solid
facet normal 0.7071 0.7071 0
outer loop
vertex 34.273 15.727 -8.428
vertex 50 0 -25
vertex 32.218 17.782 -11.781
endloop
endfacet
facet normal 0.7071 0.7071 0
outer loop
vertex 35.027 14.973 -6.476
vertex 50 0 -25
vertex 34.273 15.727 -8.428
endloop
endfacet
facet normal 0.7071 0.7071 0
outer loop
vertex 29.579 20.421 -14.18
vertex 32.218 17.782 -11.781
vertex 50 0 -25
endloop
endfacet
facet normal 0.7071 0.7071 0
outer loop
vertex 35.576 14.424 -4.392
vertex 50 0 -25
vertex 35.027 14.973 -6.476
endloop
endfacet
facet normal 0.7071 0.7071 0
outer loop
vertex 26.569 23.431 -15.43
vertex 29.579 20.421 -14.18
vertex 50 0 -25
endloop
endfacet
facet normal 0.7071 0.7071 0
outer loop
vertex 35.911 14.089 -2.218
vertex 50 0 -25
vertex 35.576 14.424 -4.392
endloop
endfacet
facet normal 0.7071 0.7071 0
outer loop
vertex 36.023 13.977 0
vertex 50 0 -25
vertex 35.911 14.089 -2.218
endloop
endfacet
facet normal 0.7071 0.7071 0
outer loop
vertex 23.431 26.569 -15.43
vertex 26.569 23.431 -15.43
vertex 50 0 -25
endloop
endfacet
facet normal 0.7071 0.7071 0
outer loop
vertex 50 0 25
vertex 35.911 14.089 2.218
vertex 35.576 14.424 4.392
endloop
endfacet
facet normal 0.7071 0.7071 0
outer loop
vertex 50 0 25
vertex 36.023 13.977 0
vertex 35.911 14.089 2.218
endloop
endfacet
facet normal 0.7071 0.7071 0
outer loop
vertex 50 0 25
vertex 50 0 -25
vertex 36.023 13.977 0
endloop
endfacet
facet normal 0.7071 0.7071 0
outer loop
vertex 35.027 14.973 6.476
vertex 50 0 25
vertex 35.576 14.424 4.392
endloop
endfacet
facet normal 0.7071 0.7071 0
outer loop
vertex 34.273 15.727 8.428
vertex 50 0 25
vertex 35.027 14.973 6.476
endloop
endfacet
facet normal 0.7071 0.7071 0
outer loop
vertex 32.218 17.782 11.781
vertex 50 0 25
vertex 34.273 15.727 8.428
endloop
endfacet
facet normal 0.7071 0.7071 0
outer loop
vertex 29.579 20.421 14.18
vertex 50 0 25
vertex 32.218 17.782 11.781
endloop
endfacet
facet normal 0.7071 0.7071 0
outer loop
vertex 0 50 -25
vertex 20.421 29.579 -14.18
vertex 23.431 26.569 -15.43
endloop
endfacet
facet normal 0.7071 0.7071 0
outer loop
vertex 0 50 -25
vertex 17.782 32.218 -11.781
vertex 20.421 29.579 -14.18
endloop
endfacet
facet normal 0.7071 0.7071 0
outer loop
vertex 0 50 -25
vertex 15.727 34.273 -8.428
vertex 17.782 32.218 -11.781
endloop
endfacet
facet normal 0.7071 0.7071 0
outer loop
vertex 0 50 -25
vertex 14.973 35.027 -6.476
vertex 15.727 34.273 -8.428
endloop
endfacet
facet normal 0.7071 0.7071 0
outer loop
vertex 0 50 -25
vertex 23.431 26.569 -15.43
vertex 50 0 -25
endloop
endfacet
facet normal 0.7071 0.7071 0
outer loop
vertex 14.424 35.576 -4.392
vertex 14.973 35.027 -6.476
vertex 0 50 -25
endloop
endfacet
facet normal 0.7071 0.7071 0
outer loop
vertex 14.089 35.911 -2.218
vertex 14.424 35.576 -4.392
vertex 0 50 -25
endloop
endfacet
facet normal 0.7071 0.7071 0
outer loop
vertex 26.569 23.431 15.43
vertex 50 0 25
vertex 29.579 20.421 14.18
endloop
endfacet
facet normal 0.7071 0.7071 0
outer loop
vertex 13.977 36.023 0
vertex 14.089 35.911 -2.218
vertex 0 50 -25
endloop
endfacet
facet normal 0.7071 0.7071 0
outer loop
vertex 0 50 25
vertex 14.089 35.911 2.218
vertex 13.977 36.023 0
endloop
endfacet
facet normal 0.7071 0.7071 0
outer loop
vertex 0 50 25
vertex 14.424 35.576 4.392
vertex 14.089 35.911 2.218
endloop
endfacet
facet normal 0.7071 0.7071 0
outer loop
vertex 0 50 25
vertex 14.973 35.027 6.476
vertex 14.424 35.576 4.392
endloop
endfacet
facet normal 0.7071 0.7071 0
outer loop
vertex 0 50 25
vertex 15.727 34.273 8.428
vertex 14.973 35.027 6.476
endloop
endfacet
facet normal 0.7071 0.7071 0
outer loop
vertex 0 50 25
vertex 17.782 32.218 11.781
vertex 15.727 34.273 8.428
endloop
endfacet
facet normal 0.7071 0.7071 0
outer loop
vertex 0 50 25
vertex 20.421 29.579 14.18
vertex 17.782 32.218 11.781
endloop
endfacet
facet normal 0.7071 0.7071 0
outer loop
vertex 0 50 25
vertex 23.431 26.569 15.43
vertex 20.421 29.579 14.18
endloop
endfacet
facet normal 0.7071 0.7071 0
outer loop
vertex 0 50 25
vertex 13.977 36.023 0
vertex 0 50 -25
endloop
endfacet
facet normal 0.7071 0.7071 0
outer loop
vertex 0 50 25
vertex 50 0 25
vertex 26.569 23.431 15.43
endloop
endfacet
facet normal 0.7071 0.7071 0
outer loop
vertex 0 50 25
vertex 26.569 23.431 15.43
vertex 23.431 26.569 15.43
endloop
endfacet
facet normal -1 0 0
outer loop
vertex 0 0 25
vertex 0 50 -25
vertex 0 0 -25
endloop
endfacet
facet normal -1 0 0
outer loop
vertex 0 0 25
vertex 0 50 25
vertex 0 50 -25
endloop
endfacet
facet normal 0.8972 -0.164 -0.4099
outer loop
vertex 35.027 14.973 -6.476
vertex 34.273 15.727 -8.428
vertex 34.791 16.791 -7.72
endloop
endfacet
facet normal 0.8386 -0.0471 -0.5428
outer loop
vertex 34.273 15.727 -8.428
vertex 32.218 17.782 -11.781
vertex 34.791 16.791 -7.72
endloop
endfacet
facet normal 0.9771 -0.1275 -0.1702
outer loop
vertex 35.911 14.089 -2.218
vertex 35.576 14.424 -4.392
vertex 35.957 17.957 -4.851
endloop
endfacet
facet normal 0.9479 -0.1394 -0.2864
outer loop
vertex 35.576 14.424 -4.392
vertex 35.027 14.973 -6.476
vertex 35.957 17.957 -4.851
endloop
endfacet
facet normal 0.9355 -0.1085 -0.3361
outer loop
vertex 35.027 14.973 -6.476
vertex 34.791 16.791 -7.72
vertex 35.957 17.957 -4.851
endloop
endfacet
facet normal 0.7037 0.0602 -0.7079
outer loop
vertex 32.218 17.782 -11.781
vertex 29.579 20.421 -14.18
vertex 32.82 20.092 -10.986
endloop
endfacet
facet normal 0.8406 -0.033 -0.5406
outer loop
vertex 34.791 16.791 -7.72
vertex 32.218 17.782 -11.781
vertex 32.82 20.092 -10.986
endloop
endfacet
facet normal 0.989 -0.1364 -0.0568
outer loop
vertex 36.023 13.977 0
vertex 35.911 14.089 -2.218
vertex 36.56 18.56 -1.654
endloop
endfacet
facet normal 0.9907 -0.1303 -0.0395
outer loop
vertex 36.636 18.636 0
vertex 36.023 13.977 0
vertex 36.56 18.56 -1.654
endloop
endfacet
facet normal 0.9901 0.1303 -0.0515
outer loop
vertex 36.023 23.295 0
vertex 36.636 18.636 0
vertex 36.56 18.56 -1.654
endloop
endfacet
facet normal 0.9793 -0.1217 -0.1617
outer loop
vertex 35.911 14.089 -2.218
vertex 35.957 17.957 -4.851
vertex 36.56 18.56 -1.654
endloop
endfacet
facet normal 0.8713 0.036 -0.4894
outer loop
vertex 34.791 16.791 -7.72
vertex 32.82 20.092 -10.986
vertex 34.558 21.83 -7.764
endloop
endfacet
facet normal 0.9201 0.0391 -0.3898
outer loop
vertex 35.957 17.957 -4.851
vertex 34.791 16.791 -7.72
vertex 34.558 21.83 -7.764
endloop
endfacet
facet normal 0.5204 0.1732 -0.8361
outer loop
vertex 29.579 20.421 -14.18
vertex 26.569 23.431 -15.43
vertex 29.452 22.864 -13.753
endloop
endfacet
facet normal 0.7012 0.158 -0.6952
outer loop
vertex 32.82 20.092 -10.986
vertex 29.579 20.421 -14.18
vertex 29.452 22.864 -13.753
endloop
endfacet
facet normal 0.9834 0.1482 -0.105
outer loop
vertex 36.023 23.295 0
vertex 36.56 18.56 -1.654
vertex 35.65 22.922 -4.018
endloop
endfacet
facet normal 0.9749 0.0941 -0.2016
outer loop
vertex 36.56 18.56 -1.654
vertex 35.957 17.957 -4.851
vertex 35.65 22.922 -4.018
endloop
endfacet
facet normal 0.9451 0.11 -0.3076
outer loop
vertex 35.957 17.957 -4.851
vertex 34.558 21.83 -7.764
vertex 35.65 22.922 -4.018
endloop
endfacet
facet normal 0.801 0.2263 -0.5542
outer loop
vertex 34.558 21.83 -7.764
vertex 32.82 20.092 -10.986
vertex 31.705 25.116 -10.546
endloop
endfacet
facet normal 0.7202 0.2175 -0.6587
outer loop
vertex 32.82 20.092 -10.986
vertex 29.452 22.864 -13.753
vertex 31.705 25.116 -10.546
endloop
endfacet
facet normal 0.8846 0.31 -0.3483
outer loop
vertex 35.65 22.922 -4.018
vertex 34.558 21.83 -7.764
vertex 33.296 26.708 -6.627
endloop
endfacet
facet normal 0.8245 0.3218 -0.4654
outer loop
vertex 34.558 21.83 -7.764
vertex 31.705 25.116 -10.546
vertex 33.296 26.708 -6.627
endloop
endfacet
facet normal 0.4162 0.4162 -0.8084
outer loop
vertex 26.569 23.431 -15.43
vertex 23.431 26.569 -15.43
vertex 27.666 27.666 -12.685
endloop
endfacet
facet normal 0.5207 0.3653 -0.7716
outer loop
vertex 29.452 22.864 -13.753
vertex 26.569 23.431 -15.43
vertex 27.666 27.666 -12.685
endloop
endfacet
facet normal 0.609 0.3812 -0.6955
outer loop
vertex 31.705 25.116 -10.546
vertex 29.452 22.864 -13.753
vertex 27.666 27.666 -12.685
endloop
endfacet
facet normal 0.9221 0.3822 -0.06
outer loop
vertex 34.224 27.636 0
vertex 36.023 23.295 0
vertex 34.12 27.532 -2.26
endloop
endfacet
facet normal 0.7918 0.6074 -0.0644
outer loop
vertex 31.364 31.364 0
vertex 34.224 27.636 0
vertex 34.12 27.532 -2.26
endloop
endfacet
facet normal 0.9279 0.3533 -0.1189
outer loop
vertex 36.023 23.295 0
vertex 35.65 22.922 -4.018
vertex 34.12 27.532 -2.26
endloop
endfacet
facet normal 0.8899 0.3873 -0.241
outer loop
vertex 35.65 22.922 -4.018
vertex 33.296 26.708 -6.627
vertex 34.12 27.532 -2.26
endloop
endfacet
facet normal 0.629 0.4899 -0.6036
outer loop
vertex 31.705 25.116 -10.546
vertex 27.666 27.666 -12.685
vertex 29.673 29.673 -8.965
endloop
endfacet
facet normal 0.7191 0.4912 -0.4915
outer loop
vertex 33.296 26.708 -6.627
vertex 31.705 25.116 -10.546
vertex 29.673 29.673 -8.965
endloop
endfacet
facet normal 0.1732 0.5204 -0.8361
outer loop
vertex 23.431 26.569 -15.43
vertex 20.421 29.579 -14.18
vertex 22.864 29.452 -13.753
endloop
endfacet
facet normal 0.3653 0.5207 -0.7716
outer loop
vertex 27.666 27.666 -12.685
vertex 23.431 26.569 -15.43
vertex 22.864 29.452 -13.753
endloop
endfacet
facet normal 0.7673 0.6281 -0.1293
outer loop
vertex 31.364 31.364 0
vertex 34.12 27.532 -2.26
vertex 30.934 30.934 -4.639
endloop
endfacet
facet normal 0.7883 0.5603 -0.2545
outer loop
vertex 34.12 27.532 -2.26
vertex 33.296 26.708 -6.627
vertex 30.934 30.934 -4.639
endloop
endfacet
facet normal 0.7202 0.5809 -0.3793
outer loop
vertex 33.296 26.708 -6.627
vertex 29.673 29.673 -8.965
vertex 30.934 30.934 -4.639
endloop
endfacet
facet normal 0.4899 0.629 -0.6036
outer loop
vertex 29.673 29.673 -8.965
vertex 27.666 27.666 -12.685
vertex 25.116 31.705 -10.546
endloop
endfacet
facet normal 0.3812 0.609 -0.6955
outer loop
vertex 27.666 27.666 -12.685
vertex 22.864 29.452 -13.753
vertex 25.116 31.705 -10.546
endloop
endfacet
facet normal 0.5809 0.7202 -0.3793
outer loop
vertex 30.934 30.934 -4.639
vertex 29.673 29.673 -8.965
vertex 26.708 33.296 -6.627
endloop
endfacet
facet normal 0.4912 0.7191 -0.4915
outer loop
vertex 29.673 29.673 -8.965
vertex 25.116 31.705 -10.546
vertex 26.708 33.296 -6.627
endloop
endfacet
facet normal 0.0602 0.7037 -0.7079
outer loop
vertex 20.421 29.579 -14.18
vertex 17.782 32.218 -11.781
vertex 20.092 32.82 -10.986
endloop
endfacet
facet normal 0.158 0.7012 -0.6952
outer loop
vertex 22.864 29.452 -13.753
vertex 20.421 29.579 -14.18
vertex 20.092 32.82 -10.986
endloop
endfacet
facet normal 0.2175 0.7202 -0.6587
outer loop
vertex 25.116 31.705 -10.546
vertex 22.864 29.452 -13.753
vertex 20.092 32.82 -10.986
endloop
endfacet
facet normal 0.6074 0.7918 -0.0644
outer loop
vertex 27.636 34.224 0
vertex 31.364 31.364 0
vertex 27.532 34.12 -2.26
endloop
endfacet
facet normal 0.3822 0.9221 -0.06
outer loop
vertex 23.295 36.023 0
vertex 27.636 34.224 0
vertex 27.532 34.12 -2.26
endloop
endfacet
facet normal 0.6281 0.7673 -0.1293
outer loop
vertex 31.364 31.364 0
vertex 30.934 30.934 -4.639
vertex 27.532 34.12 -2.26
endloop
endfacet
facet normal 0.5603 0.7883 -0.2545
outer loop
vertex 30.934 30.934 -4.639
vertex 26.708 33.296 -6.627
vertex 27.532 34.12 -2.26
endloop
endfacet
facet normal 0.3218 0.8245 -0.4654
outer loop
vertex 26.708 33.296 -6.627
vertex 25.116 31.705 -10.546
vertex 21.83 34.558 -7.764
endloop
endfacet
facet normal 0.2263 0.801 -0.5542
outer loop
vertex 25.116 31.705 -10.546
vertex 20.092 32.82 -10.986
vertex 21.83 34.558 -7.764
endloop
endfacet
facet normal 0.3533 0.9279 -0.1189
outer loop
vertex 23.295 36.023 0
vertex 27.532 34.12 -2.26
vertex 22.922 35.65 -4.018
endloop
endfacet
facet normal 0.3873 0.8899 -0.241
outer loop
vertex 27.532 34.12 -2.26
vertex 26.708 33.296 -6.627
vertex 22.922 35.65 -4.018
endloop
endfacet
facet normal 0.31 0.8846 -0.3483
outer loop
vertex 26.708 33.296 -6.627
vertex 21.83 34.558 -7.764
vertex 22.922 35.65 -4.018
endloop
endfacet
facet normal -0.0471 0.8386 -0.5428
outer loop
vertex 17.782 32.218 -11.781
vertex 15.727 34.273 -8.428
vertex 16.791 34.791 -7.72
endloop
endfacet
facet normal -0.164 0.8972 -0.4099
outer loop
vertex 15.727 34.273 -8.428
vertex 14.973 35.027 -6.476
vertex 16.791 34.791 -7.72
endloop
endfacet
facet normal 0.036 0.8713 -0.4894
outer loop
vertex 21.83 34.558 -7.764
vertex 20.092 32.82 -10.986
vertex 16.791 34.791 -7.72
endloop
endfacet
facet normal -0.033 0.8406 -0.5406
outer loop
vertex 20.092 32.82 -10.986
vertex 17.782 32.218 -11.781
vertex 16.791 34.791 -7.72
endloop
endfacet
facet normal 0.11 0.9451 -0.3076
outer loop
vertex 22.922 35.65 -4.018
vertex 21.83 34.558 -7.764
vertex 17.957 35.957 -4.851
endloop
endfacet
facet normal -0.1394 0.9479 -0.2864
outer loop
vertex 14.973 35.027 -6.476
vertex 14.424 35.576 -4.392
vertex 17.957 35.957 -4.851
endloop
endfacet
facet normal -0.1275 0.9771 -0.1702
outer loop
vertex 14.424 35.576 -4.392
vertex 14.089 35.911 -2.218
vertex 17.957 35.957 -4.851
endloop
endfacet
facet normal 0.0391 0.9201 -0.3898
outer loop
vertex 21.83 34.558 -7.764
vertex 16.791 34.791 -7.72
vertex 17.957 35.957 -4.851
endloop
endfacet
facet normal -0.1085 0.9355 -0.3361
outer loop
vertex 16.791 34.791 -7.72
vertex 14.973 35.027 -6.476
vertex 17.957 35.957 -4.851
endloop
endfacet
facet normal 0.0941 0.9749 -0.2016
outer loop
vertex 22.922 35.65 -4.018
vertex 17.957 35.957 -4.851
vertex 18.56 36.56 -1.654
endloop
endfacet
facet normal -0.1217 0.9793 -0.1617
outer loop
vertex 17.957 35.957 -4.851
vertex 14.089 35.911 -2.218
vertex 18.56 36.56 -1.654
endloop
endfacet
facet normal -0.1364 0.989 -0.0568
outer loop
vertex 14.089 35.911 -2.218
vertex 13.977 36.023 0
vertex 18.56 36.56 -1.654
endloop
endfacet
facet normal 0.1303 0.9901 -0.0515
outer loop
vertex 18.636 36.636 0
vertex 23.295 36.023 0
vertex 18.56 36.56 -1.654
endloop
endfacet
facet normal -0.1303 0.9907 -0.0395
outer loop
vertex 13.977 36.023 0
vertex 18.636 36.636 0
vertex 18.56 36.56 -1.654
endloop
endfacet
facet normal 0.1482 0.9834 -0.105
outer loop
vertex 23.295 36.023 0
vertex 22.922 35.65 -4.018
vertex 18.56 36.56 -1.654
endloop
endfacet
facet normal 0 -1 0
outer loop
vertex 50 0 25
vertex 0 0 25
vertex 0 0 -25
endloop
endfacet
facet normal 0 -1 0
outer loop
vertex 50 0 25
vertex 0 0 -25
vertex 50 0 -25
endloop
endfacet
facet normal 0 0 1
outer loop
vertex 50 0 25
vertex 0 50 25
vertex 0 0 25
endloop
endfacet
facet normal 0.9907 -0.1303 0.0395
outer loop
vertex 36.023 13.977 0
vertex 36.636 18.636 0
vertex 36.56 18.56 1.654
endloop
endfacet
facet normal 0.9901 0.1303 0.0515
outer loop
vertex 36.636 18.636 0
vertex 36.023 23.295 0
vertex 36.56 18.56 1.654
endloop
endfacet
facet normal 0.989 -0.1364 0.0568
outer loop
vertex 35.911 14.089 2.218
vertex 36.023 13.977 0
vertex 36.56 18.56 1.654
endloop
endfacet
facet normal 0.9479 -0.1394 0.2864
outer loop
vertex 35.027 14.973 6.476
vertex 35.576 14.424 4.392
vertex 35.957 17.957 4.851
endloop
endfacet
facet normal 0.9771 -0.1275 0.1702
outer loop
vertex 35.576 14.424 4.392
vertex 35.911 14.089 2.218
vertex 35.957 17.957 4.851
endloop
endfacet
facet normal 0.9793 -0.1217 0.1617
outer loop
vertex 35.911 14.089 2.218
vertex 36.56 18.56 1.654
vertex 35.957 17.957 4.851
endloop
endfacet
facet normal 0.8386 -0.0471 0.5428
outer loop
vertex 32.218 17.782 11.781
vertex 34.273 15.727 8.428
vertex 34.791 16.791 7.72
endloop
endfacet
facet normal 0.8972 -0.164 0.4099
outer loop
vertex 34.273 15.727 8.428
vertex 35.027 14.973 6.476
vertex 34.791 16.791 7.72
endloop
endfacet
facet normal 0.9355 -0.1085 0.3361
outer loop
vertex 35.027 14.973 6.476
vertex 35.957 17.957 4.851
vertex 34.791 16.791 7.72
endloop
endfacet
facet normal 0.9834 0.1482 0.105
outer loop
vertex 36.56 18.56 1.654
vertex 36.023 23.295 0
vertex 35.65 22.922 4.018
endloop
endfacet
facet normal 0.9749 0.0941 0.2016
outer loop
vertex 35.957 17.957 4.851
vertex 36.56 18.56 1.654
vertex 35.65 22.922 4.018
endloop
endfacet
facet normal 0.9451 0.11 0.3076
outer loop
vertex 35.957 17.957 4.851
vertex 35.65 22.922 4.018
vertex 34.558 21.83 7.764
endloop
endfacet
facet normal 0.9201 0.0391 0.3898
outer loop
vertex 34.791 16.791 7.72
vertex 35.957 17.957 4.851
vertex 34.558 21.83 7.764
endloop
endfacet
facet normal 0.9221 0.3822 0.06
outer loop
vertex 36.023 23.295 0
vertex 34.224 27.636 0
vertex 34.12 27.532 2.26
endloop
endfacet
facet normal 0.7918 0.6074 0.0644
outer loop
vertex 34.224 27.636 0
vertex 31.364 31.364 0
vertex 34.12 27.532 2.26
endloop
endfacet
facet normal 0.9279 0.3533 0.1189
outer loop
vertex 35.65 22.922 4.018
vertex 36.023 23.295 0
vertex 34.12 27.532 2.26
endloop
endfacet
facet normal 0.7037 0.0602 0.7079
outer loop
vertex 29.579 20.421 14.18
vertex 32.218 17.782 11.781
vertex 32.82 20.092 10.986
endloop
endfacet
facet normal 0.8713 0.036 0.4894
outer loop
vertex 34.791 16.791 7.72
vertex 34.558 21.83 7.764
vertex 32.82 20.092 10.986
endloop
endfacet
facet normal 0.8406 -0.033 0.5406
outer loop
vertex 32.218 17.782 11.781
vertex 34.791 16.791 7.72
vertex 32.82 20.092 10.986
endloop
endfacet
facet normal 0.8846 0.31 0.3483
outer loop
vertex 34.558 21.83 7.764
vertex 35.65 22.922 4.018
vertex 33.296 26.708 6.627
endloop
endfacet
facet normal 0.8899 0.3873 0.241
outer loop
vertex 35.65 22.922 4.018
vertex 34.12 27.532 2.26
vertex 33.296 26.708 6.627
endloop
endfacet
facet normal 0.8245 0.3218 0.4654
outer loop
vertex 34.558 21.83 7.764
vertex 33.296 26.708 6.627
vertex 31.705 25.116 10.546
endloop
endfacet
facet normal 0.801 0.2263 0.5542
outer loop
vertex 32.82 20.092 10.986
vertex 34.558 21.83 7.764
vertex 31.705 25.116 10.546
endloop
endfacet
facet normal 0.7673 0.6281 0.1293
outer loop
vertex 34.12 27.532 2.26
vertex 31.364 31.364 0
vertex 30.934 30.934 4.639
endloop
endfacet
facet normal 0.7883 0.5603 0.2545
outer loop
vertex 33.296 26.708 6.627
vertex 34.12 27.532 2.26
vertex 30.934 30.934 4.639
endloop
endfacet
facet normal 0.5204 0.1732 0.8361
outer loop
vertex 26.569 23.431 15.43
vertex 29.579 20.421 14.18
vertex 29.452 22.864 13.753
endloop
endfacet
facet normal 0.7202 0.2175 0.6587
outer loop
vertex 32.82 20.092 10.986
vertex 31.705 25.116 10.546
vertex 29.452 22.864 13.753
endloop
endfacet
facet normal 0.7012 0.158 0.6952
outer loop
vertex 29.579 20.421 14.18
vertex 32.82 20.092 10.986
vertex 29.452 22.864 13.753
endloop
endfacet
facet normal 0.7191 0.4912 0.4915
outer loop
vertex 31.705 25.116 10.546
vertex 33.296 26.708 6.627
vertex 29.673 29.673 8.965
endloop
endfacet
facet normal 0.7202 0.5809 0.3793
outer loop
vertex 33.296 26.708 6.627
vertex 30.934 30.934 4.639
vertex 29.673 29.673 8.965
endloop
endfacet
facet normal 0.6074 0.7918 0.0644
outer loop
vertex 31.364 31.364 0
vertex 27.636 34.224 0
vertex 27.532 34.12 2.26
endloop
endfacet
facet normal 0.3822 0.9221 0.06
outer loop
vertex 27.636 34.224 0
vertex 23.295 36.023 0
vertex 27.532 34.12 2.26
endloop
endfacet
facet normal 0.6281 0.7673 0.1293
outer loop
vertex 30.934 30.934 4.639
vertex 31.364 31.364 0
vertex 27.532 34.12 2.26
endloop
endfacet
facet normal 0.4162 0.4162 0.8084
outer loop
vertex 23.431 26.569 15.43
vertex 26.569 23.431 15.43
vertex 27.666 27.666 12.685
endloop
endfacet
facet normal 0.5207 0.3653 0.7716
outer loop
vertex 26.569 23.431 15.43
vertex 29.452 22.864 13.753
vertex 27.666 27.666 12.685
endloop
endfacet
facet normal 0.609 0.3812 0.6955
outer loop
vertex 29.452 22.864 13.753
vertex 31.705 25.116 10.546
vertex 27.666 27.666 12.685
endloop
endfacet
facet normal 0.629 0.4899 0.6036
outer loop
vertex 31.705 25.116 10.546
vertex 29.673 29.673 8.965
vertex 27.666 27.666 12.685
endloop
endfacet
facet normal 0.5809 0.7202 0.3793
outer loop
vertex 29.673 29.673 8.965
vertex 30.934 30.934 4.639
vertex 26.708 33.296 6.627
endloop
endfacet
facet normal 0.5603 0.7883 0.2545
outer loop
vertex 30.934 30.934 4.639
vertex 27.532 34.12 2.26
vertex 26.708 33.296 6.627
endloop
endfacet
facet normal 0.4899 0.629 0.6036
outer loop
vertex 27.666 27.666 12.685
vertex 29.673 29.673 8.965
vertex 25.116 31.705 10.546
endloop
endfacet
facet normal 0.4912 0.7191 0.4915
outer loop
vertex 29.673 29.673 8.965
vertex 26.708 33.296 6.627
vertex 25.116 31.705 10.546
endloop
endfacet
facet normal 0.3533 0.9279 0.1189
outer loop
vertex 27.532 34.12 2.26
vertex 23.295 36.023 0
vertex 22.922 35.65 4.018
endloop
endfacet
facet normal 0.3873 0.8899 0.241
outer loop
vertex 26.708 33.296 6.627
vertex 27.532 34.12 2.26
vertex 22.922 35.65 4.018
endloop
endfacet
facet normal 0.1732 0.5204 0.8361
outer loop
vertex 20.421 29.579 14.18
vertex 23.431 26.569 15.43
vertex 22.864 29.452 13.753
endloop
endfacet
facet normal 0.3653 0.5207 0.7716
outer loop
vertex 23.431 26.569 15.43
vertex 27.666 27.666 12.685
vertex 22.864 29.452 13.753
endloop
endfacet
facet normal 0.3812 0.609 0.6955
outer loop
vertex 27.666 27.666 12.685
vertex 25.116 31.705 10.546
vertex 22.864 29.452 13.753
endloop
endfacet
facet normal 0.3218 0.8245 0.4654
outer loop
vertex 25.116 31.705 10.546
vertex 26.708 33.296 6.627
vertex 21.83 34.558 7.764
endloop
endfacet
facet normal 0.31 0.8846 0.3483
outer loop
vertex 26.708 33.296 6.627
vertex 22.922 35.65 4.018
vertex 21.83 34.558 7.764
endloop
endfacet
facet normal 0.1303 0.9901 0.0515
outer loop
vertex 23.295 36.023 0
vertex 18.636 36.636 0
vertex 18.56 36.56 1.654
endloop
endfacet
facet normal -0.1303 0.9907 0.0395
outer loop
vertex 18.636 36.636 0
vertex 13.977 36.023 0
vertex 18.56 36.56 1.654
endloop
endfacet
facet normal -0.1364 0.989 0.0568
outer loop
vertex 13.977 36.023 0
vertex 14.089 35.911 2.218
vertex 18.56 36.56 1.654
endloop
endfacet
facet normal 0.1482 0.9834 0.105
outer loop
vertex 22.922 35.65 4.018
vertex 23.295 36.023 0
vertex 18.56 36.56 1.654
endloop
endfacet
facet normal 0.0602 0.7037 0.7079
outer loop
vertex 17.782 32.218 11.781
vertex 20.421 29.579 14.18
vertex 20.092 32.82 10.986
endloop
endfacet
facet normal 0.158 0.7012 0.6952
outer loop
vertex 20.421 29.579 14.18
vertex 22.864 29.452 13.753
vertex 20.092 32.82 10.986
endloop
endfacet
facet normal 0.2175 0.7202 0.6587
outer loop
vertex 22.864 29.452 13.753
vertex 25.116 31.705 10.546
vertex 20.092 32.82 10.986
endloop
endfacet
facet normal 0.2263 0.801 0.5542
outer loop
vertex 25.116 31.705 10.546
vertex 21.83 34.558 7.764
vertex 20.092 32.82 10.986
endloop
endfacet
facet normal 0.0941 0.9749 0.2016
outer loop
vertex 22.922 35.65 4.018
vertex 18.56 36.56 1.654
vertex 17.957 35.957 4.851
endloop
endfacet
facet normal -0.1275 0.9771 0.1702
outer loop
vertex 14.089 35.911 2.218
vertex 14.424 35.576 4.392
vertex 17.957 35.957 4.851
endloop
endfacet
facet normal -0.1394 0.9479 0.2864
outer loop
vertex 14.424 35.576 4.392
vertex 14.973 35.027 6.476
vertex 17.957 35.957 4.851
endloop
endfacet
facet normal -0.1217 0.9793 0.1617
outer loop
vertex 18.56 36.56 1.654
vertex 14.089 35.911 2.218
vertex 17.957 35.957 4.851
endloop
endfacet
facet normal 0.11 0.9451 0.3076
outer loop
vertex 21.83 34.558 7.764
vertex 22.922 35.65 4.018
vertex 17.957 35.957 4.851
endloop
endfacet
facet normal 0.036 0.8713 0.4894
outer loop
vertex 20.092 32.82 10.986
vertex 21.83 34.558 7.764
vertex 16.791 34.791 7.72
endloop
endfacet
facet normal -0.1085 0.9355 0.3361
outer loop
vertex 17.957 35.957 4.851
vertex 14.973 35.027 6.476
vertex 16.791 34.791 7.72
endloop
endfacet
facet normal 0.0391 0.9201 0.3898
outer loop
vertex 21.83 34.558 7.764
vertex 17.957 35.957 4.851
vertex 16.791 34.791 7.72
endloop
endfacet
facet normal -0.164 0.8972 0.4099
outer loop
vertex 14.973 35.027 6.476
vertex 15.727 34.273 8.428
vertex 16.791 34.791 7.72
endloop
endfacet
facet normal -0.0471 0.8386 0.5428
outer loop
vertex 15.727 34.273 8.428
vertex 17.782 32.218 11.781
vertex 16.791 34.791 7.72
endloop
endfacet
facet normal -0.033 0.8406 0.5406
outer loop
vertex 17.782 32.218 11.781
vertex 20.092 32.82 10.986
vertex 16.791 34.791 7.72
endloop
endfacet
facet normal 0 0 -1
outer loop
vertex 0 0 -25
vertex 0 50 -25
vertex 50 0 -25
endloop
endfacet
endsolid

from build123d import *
from build123d.topology import SkipClean

# Parameters (mm, degrees)
BOSS_EXTRUDE1_DEPTH = 25


with BuildPart() as part:
    # Sketch1 → Boss-Extrude1 (new, symmetric)
    with BuildSketch(Plane.XY):
        Polygon((0, 50), (0, 0), (50, 0), align=None)
    extrude(amount=BOSS_EXTRUDE1_DEPTH, both=True)

    # Sketch2 → Revolve1 (revolve)
    with SkipClean():  # the faces are left unmerged after this step: merging them gives an invalid solid
        with BuildSketch(Plane.XY):
            with BuildLine():
                Line((5.908116908, 31.363961031), (31.363961031, 5.908116908))
                ThreePointArc((31.363961031, 5.908116908), (31.363961031, 31.363961031), (5.908116908, 31.363961031))
            make_face()
        revolve(axis=Axis((5.908116908, 31.363961031, 0), (0.7071067811865475, -0.7071067811865476, 0)))


solid = part.part
